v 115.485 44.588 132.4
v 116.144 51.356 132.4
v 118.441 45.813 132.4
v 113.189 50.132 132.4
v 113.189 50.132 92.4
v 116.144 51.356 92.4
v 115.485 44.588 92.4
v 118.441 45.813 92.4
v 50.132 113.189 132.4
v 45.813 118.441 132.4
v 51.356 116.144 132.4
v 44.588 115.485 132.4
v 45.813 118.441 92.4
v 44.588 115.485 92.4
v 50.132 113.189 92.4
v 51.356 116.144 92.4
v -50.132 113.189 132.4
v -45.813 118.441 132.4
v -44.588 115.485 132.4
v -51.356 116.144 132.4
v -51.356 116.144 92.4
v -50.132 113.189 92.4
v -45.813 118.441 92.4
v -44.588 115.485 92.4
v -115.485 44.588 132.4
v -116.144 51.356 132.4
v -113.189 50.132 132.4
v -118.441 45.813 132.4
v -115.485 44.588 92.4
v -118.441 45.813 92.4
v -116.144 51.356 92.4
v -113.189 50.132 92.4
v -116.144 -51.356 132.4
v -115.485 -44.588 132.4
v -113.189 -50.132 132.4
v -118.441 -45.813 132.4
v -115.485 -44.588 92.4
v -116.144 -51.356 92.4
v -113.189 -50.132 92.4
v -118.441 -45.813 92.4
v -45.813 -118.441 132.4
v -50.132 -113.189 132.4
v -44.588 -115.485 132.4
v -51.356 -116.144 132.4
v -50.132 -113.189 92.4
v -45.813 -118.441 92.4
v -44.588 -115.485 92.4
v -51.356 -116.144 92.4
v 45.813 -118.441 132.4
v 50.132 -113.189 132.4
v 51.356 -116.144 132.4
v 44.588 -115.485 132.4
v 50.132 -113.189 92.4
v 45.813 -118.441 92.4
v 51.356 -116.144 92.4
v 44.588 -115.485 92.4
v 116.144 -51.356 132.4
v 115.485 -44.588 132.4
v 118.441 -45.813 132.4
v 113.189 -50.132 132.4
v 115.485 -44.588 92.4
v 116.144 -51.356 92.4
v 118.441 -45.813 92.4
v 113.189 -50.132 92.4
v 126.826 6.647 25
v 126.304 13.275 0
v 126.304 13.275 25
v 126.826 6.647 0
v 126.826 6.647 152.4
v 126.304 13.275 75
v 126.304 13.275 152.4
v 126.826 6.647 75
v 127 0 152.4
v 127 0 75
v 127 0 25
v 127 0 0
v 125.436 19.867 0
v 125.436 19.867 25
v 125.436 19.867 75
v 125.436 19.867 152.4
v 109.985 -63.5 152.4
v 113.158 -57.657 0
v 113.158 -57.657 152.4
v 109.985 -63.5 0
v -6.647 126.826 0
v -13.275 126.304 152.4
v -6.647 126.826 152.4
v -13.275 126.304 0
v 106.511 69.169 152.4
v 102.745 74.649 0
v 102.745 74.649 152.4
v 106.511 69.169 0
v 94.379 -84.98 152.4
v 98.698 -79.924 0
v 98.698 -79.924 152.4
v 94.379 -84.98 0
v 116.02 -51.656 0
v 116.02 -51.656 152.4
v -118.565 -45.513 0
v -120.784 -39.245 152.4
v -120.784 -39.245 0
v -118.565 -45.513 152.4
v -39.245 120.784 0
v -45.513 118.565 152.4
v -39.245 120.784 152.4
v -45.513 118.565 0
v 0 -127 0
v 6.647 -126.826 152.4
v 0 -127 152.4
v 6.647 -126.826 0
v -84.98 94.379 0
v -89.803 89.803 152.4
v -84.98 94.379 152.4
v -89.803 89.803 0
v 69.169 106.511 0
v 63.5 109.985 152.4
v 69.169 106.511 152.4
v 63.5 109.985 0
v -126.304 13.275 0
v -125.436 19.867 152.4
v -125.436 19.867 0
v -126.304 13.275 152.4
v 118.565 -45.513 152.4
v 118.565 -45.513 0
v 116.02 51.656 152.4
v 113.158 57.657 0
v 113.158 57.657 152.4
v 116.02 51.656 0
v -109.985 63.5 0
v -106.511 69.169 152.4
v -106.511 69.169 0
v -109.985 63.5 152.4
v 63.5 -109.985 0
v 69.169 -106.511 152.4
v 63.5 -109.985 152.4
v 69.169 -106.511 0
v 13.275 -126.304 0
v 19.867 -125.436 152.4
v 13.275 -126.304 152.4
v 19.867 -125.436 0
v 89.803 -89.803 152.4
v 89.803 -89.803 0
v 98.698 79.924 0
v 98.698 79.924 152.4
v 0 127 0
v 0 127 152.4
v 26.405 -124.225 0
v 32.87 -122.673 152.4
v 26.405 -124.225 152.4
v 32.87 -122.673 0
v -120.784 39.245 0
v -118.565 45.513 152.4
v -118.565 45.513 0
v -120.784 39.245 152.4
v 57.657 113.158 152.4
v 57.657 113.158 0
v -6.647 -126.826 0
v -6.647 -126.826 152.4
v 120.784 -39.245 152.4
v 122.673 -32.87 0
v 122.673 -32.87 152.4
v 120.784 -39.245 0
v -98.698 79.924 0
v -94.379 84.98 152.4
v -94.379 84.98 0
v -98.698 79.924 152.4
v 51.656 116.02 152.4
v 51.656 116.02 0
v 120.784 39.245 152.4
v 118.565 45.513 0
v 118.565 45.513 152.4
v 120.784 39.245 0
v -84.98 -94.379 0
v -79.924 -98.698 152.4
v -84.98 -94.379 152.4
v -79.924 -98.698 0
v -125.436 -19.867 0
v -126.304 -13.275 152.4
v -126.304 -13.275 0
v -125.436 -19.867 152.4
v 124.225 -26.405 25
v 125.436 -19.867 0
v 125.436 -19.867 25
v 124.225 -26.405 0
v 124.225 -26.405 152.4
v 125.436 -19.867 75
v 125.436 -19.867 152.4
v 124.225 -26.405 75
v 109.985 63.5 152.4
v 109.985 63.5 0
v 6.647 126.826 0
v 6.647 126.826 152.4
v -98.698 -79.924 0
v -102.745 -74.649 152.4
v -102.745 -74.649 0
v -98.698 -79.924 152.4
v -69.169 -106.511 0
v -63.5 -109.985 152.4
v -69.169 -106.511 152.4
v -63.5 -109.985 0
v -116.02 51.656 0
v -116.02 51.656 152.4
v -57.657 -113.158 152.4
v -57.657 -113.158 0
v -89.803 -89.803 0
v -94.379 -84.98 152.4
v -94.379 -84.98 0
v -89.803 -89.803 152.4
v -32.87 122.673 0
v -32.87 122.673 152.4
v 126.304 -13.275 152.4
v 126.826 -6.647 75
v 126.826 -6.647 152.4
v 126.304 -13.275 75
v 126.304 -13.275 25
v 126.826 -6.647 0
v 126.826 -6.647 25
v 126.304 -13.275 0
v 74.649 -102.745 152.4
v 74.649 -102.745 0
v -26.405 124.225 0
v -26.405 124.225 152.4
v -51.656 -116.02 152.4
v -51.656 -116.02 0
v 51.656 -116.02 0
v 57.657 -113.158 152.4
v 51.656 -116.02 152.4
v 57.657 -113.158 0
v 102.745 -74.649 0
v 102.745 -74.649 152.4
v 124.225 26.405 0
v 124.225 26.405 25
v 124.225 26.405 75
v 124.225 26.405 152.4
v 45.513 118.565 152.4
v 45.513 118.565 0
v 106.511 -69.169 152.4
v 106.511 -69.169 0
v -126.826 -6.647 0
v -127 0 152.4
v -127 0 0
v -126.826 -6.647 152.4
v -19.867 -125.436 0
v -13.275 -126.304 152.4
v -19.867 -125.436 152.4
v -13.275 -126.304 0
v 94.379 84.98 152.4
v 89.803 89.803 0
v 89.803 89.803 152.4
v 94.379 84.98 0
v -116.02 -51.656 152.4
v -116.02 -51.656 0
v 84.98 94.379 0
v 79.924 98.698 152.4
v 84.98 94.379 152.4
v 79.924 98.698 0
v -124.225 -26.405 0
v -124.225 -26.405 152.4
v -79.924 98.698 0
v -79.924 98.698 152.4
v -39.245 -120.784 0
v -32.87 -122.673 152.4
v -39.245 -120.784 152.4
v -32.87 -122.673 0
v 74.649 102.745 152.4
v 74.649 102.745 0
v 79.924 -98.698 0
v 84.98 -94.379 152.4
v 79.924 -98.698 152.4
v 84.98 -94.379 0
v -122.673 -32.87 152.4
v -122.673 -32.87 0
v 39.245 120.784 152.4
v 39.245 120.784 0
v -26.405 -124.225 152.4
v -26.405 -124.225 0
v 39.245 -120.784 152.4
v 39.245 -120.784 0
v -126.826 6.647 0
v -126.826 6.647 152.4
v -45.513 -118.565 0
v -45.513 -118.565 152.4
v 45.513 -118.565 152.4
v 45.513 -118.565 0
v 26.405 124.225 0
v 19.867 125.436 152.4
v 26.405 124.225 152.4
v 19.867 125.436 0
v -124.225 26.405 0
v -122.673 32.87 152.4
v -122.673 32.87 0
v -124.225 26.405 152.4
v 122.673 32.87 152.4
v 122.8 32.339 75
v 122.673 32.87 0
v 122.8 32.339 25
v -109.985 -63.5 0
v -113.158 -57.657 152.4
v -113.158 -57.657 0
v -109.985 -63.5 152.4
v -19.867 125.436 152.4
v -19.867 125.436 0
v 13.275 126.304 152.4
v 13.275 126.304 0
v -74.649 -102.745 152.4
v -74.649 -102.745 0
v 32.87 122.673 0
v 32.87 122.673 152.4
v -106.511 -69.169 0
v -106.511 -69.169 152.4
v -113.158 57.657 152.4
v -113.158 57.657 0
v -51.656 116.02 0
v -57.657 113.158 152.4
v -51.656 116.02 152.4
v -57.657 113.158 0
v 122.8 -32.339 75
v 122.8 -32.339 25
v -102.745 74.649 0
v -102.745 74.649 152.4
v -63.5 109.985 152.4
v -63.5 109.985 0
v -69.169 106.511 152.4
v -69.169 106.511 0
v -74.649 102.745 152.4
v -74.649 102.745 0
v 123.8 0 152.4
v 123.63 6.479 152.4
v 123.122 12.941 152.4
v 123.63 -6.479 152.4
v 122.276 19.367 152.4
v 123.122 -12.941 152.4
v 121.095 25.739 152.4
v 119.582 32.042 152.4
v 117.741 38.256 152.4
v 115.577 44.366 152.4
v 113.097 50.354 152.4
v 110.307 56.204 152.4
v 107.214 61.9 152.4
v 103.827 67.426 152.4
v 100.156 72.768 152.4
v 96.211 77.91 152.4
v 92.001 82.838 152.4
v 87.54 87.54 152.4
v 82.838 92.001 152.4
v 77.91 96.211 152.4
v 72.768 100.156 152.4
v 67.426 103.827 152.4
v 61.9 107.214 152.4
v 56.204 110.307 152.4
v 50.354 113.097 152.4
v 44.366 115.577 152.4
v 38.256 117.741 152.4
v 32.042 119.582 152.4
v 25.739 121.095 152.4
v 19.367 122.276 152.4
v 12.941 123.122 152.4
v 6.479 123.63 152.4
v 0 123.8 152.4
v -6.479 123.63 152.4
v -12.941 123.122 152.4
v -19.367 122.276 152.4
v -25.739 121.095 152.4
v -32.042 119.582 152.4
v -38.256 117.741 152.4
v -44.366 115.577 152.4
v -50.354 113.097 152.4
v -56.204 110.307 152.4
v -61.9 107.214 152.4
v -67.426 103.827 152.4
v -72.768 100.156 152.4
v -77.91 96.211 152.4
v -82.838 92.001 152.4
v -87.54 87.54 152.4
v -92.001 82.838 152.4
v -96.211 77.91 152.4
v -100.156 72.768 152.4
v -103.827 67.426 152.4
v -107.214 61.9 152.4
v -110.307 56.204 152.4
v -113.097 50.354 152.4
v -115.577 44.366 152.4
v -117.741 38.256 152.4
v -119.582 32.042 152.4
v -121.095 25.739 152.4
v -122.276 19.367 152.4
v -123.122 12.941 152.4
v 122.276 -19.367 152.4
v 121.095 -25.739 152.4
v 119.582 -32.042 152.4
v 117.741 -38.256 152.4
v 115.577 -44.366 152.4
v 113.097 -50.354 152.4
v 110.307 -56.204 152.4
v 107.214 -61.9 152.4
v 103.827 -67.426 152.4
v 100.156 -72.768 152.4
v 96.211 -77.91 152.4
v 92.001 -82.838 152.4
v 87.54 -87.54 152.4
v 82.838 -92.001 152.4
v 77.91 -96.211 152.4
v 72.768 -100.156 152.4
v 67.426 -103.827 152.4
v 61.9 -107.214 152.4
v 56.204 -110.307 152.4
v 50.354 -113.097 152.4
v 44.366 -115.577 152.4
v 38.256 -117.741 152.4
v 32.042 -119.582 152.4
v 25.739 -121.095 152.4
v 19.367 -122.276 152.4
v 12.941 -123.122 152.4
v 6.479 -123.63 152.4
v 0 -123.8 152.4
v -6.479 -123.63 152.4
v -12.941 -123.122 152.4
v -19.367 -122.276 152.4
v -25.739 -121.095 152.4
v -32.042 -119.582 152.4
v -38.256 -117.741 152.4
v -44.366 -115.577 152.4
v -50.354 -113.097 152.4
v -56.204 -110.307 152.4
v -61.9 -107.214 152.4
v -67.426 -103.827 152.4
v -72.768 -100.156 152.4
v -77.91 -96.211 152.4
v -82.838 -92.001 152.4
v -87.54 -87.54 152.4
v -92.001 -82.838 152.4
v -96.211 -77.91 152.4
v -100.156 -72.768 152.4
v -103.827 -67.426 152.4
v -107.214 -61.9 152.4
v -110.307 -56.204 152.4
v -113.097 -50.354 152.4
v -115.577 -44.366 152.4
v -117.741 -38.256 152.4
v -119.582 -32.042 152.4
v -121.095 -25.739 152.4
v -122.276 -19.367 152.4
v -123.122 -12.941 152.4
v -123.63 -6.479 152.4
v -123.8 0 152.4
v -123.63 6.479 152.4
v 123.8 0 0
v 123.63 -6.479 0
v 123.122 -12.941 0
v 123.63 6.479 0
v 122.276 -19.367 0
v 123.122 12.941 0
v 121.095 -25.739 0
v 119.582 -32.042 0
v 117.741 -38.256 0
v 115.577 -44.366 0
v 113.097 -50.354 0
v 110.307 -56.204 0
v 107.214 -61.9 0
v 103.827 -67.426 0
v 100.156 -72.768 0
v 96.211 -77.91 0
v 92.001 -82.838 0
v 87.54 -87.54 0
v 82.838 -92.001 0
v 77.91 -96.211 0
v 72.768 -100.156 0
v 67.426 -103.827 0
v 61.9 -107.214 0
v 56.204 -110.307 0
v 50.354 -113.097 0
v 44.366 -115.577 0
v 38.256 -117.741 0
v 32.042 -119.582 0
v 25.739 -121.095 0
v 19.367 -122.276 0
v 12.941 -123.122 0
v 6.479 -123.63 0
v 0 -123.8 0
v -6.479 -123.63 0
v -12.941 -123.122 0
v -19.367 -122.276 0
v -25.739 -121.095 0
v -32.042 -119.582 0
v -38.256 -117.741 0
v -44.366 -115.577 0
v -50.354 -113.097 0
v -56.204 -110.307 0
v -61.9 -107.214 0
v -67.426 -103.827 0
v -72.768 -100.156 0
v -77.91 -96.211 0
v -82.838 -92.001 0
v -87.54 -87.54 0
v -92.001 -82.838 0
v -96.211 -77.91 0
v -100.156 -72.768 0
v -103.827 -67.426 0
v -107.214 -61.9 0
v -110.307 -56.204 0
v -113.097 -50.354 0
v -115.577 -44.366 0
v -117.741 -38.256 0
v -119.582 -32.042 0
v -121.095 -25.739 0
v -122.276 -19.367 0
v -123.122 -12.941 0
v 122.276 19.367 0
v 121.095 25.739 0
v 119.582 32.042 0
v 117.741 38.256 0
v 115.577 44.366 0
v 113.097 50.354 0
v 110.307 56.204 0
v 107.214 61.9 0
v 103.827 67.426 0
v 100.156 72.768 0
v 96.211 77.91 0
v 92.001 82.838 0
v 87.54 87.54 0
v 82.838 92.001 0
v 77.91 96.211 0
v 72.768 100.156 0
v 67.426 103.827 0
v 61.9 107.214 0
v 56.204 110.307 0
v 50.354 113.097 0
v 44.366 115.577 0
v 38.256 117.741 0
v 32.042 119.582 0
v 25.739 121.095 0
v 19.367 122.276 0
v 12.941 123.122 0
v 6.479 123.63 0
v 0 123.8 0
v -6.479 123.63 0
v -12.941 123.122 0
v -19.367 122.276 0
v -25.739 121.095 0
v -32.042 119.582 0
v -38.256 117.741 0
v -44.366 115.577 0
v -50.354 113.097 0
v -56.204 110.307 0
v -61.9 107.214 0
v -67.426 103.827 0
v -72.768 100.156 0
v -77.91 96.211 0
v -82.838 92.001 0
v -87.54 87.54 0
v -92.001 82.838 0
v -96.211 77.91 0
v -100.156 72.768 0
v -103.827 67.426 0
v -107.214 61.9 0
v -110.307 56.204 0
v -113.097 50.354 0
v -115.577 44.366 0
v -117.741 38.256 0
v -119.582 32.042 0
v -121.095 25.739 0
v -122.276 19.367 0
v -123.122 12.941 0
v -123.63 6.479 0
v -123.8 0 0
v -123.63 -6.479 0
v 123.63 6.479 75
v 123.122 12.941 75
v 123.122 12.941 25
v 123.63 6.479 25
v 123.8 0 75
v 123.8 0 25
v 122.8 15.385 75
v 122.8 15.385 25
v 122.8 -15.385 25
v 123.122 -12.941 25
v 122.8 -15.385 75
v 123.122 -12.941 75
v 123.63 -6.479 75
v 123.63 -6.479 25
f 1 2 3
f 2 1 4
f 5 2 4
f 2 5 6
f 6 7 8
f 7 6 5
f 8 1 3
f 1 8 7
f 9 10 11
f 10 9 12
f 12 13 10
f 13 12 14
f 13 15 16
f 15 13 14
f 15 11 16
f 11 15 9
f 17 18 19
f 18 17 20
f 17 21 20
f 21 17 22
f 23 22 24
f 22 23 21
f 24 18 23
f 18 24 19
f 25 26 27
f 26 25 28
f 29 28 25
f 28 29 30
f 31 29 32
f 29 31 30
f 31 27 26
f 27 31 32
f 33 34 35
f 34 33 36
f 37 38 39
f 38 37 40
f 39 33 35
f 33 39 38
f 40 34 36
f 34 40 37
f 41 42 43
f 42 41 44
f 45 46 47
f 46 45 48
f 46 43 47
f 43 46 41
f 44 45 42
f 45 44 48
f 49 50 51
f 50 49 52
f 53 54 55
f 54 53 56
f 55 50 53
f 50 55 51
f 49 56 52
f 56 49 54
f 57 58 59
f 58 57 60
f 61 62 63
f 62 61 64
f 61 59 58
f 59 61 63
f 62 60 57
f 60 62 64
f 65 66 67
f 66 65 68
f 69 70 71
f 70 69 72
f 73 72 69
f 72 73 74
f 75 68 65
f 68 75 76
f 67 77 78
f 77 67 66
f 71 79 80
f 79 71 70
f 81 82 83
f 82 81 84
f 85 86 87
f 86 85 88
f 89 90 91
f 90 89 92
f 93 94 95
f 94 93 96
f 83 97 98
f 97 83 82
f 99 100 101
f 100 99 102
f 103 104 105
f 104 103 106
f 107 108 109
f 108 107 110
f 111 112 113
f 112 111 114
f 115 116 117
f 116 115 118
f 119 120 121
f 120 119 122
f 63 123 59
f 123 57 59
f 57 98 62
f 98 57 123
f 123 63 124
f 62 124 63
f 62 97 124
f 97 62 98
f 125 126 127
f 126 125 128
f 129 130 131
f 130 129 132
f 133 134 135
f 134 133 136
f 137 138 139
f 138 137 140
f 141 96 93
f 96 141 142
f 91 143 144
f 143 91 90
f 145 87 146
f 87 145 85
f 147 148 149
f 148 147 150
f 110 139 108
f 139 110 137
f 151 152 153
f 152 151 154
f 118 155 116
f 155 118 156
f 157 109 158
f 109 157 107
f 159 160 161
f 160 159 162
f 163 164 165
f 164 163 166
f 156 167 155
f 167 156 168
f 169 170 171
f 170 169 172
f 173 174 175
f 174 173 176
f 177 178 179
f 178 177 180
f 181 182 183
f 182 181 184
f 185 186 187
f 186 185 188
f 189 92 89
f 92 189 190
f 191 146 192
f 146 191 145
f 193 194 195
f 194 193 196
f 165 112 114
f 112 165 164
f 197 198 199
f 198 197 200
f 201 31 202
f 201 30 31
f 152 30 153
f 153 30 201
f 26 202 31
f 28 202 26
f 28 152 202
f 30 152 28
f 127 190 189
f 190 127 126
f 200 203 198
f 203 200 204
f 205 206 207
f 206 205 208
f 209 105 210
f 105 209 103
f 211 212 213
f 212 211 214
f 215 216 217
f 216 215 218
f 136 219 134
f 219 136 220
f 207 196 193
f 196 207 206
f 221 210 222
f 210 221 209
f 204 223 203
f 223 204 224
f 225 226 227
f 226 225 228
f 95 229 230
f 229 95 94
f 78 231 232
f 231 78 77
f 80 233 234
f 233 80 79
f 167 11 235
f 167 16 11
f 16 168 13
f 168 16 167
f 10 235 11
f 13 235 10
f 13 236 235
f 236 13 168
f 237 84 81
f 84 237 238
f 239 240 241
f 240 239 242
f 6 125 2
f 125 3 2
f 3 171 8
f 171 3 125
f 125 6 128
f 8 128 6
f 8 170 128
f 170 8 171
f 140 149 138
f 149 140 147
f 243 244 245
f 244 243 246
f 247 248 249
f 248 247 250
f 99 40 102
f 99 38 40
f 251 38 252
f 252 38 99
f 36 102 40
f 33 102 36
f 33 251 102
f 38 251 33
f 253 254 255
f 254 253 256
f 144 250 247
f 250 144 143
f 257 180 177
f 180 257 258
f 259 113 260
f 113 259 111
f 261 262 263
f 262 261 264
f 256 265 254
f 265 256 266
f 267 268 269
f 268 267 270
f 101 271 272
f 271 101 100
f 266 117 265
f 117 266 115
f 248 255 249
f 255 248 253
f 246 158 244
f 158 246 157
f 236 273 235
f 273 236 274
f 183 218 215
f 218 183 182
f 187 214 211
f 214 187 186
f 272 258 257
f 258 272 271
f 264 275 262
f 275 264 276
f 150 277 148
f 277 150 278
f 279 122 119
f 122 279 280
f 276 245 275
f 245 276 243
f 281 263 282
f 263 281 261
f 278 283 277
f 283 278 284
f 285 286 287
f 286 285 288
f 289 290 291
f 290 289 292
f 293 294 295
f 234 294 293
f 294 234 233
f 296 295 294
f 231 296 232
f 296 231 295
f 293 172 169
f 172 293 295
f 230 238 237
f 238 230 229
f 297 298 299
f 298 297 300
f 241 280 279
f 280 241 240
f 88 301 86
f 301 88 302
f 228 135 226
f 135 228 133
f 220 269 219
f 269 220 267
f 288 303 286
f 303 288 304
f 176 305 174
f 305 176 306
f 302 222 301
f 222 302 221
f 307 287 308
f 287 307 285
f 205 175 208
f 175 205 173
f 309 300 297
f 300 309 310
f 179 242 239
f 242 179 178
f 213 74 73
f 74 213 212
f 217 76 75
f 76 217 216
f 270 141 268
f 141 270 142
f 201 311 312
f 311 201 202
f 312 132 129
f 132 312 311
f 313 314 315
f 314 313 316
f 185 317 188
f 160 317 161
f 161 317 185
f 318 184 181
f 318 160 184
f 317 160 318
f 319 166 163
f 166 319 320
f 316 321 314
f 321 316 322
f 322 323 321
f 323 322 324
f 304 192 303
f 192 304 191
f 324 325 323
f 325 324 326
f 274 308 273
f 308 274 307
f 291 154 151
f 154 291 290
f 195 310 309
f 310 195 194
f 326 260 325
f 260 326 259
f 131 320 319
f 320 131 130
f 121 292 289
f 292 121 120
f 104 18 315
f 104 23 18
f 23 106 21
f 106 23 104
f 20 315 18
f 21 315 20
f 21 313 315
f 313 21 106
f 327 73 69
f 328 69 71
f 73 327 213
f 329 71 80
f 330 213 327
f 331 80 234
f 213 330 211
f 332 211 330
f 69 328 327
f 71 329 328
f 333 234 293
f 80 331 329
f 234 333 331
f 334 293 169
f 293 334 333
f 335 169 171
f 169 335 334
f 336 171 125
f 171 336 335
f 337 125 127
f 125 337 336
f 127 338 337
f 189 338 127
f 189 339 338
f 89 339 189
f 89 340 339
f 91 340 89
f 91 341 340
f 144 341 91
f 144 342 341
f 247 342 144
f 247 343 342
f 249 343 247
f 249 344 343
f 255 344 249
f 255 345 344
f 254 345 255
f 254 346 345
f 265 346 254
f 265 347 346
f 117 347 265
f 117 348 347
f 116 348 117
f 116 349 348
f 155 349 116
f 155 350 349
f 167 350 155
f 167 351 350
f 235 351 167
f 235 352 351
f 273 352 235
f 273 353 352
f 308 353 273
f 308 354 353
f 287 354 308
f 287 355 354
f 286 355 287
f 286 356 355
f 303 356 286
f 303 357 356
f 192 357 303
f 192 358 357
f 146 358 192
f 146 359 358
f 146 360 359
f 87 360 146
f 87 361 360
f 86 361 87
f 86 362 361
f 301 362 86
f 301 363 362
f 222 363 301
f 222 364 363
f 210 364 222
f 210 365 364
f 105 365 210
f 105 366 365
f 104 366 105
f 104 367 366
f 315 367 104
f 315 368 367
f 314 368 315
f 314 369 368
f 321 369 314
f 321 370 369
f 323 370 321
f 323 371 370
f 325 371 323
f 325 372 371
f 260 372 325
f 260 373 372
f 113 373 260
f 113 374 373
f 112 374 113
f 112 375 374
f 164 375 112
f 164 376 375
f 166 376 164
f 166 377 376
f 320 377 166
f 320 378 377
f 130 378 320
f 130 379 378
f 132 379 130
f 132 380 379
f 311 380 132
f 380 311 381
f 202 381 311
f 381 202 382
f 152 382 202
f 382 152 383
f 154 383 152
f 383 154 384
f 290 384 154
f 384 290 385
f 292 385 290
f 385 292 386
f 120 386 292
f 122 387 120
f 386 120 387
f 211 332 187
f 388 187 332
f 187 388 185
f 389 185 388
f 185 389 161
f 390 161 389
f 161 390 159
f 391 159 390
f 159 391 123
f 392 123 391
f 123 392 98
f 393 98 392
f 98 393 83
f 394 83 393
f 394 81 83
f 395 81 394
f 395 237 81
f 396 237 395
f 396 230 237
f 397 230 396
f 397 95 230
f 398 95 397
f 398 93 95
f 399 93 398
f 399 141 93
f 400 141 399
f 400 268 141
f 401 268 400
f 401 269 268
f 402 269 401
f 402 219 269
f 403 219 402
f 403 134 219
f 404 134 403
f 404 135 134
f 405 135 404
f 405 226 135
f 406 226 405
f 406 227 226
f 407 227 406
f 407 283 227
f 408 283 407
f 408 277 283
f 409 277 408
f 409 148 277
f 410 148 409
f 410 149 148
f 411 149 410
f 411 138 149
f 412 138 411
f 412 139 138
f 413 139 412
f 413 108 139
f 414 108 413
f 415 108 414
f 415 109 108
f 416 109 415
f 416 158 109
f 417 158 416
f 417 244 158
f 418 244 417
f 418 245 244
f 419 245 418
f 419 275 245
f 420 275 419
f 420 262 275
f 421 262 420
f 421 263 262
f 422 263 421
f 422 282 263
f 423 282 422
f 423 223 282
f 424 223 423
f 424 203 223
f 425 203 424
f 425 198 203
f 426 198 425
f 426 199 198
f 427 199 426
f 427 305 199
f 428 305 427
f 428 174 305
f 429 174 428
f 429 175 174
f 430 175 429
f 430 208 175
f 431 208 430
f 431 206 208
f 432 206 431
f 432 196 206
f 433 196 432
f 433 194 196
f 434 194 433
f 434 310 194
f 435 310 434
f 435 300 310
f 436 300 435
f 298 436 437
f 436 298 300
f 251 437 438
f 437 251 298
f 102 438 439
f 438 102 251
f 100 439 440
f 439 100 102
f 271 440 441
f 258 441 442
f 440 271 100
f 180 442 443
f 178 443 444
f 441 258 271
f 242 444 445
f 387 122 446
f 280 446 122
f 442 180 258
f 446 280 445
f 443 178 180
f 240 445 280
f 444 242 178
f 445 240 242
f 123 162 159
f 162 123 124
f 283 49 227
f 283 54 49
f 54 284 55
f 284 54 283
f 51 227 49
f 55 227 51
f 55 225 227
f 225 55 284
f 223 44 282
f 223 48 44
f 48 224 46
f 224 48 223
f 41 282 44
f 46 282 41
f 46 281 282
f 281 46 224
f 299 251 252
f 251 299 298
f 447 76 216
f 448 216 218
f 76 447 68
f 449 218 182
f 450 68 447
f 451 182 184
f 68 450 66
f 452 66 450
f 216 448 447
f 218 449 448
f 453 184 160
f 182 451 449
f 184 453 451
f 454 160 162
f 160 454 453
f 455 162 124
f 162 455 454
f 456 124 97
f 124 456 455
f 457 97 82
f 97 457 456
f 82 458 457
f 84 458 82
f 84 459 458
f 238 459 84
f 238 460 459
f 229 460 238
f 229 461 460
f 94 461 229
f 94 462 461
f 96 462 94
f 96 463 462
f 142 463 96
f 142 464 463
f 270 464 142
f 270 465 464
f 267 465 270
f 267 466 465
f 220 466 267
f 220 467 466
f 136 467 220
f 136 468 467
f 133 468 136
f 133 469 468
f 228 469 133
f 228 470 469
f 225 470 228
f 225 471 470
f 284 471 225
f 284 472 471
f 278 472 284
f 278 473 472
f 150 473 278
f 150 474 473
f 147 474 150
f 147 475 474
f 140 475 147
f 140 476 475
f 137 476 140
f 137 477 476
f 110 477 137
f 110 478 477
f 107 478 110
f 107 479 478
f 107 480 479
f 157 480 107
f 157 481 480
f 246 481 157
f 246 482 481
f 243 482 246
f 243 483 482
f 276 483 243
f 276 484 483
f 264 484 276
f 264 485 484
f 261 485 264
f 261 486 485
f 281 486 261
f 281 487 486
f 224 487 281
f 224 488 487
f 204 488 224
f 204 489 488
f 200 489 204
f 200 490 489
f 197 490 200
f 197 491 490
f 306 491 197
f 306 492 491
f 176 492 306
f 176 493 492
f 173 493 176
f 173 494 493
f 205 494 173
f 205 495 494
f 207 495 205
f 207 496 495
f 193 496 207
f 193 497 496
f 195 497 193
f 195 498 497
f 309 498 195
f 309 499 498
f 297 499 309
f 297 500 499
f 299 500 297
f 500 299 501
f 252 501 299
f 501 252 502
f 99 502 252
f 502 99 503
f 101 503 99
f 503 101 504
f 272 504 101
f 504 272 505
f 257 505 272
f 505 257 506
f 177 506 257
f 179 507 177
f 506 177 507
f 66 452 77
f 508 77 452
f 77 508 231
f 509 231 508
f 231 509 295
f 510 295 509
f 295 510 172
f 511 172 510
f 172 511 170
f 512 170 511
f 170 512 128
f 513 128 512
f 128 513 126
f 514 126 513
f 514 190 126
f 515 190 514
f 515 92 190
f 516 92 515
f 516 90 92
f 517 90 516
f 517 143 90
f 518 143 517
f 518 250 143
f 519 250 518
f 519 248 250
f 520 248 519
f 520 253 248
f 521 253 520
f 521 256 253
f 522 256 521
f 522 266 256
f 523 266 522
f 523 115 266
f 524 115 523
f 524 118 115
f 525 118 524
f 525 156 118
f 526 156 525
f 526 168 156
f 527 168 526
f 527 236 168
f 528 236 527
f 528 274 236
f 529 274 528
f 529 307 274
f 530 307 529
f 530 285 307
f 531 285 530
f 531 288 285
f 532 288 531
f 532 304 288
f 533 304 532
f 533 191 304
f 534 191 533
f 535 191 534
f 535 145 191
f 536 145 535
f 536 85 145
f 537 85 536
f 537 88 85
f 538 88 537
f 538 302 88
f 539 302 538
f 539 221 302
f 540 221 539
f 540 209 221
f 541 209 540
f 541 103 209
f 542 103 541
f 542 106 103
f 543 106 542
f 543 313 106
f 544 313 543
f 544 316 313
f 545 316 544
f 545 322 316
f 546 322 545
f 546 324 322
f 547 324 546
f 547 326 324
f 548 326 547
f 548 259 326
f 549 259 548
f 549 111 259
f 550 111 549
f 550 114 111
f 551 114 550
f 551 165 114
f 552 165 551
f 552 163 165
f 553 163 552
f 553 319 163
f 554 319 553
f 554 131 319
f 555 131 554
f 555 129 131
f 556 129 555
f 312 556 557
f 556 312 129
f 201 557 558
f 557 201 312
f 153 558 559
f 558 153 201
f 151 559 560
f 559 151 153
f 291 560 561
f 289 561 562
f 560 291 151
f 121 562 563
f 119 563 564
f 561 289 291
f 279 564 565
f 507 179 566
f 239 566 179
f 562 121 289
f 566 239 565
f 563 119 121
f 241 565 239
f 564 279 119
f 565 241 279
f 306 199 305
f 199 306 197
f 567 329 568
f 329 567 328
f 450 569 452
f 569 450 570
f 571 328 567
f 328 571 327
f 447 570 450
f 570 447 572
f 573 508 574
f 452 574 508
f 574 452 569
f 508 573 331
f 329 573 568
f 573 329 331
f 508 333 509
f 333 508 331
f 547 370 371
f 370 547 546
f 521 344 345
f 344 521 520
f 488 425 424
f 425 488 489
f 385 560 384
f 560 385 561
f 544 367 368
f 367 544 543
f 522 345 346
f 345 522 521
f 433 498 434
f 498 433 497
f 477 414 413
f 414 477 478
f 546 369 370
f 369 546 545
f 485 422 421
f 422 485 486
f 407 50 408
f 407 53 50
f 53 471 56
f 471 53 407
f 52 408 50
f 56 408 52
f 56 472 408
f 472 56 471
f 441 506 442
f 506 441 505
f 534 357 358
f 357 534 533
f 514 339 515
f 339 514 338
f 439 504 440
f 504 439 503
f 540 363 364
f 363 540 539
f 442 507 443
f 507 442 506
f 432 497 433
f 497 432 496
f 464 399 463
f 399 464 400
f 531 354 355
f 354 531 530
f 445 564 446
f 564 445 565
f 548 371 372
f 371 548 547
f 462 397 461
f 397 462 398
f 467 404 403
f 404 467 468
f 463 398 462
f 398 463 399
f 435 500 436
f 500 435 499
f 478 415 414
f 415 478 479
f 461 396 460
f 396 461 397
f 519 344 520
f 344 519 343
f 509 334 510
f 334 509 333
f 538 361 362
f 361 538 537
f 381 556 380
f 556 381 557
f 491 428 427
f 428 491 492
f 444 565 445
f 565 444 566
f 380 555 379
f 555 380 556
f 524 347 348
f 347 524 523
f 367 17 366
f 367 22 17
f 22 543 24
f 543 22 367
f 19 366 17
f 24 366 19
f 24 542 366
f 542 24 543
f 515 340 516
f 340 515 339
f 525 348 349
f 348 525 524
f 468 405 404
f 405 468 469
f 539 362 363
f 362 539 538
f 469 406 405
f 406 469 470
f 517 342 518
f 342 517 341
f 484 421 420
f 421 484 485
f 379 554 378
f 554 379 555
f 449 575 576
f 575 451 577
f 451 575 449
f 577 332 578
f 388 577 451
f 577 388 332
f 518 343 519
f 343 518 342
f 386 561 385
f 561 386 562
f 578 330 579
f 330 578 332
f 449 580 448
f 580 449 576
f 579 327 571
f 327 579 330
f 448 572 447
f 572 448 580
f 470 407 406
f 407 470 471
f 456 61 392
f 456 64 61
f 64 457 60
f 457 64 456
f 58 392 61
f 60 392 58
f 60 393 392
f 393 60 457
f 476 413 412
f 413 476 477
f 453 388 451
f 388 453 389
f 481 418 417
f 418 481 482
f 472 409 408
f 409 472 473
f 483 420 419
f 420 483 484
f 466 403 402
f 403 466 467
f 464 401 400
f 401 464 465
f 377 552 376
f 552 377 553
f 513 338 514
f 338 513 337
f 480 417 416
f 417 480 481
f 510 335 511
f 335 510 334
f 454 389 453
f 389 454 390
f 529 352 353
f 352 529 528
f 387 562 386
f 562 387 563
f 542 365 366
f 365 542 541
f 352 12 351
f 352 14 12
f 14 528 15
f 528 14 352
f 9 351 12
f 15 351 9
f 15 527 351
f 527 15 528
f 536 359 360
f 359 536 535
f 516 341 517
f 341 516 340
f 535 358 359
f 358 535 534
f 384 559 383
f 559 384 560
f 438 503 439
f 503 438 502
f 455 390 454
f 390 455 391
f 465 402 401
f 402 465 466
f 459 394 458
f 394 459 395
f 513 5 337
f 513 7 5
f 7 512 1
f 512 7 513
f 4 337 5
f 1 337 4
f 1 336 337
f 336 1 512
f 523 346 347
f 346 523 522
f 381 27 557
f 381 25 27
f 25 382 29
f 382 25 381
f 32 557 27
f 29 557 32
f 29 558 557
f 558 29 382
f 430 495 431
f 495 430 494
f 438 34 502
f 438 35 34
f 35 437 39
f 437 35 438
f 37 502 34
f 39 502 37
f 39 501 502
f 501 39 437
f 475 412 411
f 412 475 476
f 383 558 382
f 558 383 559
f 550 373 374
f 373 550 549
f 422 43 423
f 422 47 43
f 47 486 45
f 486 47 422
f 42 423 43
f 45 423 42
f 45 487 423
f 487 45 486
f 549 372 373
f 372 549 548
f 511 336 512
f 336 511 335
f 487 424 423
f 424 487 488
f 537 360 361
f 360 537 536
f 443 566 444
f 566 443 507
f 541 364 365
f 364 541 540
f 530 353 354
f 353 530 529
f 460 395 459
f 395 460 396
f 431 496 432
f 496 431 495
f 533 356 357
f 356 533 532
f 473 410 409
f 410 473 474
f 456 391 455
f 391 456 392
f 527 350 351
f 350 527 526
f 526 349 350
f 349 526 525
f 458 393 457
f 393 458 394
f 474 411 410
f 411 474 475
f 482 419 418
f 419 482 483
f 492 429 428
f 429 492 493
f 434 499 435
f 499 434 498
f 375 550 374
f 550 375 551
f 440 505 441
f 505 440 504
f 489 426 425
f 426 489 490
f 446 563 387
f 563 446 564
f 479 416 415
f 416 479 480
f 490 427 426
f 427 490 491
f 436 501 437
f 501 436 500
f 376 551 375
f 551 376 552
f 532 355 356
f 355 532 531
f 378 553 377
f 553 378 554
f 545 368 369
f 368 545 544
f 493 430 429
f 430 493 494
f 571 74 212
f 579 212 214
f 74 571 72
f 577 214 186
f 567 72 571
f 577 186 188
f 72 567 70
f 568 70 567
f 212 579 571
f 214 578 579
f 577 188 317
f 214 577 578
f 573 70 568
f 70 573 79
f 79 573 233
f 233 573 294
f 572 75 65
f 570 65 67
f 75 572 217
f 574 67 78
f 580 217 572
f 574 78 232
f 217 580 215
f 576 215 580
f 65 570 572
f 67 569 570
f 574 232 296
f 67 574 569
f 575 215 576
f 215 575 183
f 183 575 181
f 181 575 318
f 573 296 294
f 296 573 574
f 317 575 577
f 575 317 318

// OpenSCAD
// ADPS-100 Enclosure Body
// Aluminum cylindrical shell - CNC from tube stock
// Material: 6061 Aluminum, Black Anodize finish
// Units: millimeters

// Design Parameters
body_od = 254;          // 10 inches outer diameter
body_id = 247.6;        // Inner diameter (wall = 3.2mm / 1/8")
body_height = 152.4;    // 6 inches height
wall_thickness = 3.2;   // 1/8 inch wall

// Front panel cutout dimensions
panel_width = 80;
panel_height = 50;
panel_y_offset = 25;    // Distance from bottom

// Ventilation slots (sides)
vent_slot_width = 6;
vent_slot_height = 40;
vent_slot_count = 8;

// Resolution
$fn = 120;

module enclosure_body() {
    difference() {
        // Main cylinder
        cylinder(d=body_od, h=body_height);
        
        // Hollow interior
        translate([0, 0, -1])
            cylinder(d=body_id, h=body_height+2);
        
        // Front panel cutout
        translate([body_od/2 - wall_thickness - 1, -panel_width/2, panel_y_offset])
            cube([wall_thickness + 2, panel_width, panel_height]);
        
        // Ventilation slots (evenly distributed around circumference)
        for (i = [0:vent_slot_count-1]) {
            angle = i * (360 / vent_slot_count) + 22.5; // Offset to avoid front panel
            rotate([0, 0, angle])
                translate([body_od/2 - wall_thickness - 1, -vent_slot_width/2, body_height - vent_slot_height - 20])
                    cube([wall_thickness + 2, vent_slot_width, vent_slot_height]);
        }
    }
}

// Render
enclosure_body();

// Export notes:
// 1. Export as STL for CNC programming
// 2. Manufacturing: Turn from 10" aluminum tube stock
// 3. Cut ventilation slots with CNC mill
// 4. Cut front panel opening with CNC mill
// 5. Deburr all edges
// 6. Black anodize after machining
